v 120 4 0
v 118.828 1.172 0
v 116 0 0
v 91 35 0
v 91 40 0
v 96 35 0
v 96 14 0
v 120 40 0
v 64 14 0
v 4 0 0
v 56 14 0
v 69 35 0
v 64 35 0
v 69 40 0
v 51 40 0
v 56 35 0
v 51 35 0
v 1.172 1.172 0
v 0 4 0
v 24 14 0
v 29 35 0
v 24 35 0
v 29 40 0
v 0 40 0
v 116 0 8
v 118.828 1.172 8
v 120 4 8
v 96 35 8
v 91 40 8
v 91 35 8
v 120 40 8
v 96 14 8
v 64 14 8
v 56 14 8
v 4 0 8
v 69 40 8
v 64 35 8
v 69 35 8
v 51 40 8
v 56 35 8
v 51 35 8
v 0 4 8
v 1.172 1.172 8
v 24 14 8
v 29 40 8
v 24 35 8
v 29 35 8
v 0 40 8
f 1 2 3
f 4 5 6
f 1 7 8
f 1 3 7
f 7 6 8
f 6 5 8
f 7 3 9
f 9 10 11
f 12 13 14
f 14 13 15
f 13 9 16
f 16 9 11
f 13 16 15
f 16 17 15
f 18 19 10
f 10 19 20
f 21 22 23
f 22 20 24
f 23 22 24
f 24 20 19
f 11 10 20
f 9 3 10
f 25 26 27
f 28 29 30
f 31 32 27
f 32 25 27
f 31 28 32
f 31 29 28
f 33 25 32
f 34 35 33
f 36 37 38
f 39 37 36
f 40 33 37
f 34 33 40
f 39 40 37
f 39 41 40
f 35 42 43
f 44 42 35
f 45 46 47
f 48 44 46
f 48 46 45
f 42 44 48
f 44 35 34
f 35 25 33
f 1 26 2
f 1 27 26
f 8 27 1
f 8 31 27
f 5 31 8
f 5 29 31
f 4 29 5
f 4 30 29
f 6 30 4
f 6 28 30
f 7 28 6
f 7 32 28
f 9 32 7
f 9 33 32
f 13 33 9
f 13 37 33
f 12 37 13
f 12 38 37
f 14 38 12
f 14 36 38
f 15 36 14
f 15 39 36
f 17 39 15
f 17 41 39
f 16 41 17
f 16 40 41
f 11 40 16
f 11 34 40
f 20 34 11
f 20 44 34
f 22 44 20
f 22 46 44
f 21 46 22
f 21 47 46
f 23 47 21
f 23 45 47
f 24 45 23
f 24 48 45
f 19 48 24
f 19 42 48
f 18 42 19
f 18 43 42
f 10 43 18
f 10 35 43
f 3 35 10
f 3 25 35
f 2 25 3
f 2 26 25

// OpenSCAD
$fn = 32;

// ----------------------------------------------------------------------
// Oversize slot bar: 120 mm bar with 2 oversize windows
// ----------------------------------------------------------------------

// --- parameters (mm) ---
profile_height = 8;       // extrusion height
profile_points = 24;      // points of the closed outline

profile = [[0, 4], [1.172, 1.172], [4, 0], [116, 0], [118.828, 1.172], [120, 4], [120, 40], [91, 40], [91, 35], [96, 35], [96, 14], [64, 14], [64, 35], [69, 35], [69, 40], [51, 40], [51, 35], [56, 35], [56, 14], [24, 14], [24, 35], [29, 35], [29, 40], [0, 40]];  // single closed polygon, 24 points, counter clockwise

// --- the one profile operation ---
linear_extrude(height = profile_height) polygon(points = profile);
